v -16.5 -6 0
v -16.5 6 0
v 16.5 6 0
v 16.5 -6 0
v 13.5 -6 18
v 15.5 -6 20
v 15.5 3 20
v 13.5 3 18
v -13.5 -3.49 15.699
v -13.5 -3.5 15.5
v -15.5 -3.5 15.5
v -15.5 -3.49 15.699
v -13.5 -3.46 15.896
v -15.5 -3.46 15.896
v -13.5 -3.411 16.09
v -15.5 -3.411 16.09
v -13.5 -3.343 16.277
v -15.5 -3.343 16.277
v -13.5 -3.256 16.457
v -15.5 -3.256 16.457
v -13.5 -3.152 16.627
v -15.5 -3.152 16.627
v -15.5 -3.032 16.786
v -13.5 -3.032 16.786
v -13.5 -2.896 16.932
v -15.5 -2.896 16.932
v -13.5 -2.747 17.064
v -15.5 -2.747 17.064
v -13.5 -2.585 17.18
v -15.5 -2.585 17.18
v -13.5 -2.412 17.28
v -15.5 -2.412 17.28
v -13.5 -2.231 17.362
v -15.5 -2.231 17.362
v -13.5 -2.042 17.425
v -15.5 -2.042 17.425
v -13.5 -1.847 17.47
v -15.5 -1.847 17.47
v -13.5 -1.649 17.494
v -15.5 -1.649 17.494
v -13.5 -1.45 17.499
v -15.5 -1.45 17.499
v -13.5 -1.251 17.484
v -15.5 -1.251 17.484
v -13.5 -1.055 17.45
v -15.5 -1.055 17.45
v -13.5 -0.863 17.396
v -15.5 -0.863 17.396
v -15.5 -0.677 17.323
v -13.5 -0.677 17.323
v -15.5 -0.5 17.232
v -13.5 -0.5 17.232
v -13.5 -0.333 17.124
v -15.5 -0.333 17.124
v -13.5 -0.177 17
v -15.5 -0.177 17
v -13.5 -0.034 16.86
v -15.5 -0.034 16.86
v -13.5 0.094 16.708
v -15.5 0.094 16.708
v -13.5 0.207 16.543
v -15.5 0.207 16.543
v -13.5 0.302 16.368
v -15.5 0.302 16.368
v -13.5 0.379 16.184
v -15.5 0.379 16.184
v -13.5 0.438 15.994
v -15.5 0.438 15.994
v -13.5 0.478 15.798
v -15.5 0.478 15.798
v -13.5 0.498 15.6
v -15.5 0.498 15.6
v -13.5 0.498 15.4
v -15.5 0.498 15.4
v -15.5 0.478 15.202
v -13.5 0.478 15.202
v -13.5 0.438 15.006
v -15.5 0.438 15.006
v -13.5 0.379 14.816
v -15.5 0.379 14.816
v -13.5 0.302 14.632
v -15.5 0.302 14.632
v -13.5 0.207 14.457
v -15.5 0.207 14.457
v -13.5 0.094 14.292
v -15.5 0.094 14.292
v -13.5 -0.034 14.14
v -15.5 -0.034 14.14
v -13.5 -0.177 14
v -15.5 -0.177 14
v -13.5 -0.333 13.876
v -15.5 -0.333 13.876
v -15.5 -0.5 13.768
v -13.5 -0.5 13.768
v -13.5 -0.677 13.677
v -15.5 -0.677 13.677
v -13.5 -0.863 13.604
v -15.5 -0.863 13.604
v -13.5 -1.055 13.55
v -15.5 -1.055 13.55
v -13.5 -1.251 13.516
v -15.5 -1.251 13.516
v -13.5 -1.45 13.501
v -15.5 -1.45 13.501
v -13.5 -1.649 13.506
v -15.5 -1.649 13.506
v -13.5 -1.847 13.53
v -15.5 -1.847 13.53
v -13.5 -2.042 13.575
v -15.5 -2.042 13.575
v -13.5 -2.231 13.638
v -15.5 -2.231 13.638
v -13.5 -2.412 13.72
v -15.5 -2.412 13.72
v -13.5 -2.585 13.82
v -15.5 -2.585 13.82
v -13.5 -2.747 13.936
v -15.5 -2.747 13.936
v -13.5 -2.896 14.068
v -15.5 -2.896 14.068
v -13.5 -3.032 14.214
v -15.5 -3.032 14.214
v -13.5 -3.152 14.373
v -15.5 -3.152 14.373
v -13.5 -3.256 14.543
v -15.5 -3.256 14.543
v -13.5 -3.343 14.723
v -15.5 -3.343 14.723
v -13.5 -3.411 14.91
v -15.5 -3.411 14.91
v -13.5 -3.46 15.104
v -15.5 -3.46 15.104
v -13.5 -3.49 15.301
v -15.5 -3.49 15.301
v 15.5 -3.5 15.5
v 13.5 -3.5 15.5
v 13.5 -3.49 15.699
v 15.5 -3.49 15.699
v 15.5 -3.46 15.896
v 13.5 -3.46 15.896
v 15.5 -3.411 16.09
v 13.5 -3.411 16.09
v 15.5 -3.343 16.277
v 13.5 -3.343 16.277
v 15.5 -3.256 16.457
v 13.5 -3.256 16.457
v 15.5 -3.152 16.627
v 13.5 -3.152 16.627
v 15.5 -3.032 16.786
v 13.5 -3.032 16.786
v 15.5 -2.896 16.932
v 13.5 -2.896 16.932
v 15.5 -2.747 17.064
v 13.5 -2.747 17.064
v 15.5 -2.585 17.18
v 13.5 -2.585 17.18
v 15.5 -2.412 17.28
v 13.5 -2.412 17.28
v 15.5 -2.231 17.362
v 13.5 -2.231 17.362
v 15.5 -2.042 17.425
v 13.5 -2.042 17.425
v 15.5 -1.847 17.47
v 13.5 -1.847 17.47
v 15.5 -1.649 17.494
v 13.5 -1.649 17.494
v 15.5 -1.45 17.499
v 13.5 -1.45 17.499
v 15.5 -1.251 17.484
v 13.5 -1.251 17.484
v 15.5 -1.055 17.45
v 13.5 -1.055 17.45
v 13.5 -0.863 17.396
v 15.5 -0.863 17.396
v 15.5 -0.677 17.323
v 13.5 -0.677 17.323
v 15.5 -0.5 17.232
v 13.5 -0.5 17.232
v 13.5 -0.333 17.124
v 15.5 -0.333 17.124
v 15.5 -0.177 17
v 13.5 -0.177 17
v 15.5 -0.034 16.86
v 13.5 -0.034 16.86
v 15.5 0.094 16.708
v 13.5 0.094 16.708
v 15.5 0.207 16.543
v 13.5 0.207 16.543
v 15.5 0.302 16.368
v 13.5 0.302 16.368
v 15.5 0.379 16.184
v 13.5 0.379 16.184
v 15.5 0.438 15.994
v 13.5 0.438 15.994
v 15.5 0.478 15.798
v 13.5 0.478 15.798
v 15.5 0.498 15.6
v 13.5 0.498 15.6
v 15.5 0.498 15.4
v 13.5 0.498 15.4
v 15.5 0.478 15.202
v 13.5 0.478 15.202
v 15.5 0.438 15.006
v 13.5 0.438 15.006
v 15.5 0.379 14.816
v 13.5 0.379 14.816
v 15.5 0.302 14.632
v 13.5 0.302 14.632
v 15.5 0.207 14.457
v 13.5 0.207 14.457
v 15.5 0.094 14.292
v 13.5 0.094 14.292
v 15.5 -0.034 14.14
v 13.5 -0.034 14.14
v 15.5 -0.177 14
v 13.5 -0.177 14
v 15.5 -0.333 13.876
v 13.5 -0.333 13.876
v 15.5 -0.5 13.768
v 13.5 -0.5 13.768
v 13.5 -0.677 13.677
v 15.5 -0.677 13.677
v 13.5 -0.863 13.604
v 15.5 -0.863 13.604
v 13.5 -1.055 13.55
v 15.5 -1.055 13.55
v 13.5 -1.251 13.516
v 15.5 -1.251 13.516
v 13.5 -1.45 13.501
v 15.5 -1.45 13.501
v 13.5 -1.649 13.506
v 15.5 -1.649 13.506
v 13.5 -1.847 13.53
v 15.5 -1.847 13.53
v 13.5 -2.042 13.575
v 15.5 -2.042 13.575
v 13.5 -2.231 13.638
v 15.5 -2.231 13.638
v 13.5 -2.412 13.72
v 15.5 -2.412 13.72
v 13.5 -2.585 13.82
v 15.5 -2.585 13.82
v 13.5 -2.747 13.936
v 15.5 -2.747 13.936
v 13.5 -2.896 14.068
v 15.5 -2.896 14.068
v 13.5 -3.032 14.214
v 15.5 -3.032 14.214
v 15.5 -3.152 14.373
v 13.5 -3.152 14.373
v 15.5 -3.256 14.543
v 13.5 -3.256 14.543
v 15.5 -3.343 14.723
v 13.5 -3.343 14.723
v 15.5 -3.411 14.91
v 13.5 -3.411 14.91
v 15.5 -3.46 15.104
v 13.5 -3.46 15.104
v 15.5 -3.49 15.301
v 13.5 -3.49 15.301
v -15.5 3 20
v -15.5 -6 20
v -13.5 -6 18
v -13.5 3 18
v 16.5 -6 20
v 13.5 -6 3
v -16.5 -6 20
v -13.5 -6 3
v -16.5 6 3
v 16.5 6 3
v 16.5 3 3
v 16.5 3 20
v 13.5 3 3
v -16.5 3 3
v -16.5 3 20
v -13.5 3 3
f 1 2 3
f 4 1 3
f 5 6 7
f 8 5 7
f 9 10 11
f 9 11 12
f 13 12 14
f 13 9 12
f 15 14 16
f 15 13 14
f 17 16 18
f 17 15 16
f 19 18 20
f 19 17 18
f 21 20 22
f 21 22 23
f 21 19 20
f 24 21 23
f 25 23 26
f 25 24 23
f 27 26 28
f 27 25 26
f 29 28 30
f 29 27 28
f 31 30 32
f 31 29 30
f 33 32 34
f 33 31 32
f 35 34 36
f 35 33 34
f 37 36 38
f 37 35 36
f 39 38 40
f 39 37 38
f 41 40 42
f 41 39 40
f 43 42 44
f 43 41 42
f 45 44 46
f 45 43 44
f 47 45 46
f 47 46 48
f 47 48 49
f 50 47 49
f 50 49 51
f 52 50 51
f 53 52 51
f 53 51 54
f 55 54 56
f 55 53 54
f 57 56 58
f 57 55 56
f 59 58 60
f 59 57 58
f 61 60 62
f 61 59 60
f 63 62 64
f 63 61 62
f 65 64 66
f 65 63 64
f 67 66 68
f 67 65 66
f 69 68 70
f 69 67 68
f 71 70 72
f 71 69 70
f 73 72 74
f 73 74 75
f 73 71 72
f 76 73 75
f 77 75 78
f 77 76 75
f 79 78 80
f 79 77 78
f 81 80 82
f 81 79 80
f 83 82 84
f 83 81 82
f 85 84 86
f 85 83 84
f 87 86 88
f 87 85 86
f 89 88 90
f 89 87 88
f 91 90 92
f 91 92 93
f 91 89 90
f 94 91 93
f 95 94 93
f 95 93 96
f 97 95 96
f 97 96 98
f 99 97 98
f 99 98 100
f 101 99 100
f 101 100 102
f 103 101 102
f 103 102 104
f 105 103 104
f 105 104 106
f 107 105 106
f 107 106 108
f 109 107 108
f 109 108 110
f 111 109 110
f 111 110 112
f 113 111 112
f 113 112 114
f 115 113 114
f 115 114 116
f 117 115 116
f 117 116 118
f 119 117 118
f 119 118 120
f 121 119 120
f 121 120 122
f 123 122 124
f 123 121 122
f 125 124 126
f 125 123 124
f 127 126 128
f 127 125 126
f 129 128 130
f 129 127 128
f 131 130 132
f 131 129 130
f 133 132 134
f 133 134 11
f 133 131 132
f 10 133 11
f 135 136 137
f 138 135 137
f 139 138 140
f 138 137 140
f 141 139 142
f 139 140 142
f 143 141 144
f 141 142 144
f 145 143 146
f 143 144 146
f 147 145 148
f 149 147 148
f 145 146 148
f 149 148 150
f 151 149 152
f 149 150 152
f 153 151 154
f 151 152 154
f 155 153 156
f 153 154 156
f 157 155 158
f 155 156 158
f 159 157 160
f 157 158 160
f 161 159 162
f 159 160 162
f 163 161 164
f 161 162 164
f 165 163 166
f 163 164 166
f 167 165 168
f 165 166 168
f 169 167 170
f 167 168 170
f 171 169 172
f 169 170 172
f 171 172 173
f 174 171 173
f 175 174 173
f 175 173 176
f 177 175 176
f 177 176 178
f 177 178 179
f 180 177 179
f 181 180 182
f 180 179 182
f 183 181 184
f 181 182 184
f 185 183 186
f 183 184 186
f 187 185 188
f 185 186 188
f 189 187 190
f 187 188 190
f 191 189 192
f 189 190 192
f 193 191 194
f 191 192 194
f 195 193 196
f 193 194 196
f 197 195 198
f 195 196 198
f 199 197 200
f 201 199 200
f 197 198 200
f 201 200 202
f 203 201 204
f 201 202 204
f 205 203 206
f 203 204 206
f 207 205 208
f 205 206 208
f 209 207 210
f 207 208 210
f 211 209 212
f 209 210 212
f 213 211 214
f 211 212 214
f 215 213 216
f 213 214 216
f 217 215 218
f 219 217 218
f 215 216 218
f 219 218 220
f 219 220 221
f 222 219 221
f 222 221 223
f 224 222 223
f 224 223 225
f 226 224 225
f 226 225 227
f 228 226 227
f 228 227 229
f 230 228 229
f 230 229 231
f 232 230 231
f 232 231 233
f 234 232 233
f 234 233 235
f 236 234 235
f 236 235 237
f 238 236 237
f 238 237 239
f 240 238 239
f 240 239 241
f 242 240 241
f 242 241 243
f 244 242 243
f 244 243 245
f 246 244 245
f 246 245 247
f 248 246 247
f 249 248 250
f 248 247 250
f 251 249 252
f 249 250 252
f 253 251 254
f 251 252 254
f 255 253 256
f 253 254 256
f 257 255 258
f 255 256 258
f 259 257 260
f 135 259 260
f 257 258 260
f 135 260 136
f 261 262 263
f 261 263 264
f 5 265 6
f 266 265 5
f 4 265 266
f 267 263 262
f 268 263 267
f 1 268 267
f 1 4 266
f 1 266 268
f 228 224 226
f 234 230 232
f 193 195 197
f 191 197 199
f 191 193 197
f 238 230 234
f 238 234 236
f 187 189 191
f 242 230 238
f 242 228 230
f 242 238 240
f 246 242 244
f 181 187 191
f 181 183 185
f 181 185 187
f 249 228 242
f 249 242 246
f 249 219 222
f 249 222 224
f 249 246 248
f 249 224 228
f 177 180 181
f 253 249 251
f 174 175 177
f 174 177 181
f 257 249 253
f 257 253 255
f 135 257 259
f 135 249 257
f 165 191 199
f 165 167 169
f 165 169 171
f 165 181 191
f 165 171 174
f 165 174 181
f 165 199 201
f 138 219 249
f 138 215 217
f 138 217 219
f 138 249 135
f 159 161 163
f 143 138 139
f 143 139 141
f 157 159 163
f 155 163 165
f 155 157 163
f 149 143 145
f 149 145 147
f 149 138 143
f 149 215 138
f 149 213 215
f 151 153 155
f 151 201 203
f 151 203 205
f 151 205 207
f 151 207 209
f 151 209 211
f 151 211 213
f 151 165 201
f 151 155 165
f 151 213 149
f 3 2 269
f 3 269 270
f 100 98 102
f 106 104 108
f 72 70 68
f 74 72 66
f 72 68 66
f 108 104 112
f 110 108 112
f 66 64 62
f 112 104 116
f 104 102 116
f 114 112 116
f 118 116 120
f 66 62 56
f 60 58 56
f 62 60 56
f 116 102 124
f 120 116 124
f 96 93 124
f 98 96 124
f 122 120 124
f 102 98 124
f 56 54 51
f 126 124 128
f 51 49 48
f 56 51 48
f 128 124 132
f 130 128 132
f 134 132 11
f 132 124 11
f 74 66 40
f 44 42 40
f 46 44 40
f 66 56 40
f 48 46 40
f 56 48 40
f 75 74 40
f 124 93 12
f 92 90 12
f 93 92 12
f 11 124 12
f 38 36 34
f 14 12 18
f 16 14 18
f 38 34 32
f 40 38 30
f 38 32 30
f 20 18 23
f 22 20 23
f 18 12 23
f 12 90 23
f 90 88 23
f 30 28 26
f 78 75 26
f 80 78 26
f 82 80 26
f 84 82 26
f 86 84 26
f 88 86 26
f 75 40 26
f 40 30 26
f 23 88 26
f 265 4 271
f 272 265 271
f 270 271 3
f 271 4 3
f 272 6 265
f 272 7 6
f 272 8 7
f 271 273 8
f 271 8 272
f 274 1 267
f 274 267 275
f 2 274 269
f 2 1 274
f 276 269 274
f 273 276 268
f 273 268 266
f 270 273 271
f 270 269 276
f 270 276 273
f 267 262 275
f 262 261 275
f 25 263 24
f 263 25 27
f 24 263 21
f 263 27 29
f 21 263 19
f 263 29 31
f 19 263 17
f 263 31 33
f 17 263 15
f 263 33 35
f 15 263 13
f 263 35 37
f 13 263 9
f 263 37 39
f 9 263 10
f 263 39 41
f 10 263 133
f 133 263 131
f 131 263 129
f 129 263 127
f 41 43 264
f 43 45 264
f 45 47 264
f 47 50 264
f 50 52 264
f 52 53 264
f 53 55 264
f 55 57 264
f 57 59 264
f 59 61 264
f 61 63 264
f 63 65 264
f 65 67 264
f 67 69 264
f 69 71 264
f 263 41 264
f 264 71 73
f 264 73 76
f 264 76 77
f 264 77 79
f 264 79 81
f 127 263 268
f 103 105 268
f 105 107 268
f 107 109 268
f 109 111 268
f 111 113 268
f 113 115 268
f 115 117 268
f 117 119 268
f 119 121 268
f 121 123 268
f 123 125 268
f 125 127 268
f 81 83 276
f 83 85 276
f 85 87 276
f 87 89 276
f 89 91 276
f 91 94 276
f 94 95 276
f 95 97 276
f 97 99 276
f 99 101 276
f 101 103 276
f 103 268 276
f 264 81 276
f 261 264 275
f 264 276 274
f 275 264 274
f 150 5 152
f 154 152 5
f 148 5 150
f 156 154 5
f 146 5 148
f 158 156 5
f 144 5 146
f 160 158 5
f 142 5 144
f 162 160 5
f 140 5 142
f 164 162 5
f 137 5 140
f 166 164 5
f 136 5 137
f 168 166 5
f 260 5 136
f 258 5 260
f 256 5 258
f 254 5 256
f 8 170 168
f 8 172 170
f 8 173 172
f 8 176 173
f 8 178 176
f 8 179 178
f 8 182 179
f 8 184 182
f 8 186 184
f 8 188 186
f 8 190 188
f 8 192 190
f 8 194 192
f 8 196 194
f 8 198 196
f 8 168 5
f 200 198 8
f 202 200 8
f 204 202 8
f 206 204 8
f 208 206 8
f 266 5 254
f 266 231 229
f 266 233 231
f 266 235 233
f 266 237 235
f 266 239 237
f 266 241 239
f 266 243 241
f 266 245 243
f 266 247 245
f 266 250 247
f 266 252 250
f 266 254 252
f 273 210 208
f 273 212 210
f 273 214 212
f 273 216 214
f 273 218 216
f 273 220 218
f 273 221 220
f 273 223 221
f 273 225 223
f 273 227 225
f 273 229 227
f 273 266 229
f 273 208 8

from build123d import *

# Parameters (mm, degrees)
F0_W     = 33
F0_H     = 12
F1_DEPTH = 3
F2_W     = 3
F2_H     = 9
F3_DEPTH = 17
F4_R     = 2
F5_DEPTH = 2
F6_SIZE  = 2


with BuildPart() as f1:
    # F0 (on Top) → F1 (new body)
    with BuildSketch(Plane.XY):
        Rectangle(F0_W, F0_H)
    extrude(amount=F1_DEPTH)

    # F2 (on face) → F3 (join)
    with BuildSketch(Plane.XY.offset(3)):
        with Locations((15, -1.5)):
            Rectangle(F2_W, F2_H)
    extrude(amount=F3_DEPTH)

    # F4 (on face) → F5 (cut)
    with BuildSketch(Plane(origin=(13.5, 0, 0), x_dir=(0, -1, 0), z_dir=(-1, 0, 0))):
        with Locations((1.5, 15.5)):
            Circle(F4_R)
    extrude(amount=-F5_DEPTH, mode=Mode.SUBTRACT)

    # F6
    f6_edges = [f1.edges().sort_by_distance(p)[0] for p in [
        (13.5, -1.5, 20),
    ]]
    chamfer(f6_edges, length=F6_SIZE)

    # F7: F1 across plane


with BuildPart() as f1_1:
    add(f1.part)
    add(f1.part.mirror(Plane.YZ))


solid = f1_1.part
